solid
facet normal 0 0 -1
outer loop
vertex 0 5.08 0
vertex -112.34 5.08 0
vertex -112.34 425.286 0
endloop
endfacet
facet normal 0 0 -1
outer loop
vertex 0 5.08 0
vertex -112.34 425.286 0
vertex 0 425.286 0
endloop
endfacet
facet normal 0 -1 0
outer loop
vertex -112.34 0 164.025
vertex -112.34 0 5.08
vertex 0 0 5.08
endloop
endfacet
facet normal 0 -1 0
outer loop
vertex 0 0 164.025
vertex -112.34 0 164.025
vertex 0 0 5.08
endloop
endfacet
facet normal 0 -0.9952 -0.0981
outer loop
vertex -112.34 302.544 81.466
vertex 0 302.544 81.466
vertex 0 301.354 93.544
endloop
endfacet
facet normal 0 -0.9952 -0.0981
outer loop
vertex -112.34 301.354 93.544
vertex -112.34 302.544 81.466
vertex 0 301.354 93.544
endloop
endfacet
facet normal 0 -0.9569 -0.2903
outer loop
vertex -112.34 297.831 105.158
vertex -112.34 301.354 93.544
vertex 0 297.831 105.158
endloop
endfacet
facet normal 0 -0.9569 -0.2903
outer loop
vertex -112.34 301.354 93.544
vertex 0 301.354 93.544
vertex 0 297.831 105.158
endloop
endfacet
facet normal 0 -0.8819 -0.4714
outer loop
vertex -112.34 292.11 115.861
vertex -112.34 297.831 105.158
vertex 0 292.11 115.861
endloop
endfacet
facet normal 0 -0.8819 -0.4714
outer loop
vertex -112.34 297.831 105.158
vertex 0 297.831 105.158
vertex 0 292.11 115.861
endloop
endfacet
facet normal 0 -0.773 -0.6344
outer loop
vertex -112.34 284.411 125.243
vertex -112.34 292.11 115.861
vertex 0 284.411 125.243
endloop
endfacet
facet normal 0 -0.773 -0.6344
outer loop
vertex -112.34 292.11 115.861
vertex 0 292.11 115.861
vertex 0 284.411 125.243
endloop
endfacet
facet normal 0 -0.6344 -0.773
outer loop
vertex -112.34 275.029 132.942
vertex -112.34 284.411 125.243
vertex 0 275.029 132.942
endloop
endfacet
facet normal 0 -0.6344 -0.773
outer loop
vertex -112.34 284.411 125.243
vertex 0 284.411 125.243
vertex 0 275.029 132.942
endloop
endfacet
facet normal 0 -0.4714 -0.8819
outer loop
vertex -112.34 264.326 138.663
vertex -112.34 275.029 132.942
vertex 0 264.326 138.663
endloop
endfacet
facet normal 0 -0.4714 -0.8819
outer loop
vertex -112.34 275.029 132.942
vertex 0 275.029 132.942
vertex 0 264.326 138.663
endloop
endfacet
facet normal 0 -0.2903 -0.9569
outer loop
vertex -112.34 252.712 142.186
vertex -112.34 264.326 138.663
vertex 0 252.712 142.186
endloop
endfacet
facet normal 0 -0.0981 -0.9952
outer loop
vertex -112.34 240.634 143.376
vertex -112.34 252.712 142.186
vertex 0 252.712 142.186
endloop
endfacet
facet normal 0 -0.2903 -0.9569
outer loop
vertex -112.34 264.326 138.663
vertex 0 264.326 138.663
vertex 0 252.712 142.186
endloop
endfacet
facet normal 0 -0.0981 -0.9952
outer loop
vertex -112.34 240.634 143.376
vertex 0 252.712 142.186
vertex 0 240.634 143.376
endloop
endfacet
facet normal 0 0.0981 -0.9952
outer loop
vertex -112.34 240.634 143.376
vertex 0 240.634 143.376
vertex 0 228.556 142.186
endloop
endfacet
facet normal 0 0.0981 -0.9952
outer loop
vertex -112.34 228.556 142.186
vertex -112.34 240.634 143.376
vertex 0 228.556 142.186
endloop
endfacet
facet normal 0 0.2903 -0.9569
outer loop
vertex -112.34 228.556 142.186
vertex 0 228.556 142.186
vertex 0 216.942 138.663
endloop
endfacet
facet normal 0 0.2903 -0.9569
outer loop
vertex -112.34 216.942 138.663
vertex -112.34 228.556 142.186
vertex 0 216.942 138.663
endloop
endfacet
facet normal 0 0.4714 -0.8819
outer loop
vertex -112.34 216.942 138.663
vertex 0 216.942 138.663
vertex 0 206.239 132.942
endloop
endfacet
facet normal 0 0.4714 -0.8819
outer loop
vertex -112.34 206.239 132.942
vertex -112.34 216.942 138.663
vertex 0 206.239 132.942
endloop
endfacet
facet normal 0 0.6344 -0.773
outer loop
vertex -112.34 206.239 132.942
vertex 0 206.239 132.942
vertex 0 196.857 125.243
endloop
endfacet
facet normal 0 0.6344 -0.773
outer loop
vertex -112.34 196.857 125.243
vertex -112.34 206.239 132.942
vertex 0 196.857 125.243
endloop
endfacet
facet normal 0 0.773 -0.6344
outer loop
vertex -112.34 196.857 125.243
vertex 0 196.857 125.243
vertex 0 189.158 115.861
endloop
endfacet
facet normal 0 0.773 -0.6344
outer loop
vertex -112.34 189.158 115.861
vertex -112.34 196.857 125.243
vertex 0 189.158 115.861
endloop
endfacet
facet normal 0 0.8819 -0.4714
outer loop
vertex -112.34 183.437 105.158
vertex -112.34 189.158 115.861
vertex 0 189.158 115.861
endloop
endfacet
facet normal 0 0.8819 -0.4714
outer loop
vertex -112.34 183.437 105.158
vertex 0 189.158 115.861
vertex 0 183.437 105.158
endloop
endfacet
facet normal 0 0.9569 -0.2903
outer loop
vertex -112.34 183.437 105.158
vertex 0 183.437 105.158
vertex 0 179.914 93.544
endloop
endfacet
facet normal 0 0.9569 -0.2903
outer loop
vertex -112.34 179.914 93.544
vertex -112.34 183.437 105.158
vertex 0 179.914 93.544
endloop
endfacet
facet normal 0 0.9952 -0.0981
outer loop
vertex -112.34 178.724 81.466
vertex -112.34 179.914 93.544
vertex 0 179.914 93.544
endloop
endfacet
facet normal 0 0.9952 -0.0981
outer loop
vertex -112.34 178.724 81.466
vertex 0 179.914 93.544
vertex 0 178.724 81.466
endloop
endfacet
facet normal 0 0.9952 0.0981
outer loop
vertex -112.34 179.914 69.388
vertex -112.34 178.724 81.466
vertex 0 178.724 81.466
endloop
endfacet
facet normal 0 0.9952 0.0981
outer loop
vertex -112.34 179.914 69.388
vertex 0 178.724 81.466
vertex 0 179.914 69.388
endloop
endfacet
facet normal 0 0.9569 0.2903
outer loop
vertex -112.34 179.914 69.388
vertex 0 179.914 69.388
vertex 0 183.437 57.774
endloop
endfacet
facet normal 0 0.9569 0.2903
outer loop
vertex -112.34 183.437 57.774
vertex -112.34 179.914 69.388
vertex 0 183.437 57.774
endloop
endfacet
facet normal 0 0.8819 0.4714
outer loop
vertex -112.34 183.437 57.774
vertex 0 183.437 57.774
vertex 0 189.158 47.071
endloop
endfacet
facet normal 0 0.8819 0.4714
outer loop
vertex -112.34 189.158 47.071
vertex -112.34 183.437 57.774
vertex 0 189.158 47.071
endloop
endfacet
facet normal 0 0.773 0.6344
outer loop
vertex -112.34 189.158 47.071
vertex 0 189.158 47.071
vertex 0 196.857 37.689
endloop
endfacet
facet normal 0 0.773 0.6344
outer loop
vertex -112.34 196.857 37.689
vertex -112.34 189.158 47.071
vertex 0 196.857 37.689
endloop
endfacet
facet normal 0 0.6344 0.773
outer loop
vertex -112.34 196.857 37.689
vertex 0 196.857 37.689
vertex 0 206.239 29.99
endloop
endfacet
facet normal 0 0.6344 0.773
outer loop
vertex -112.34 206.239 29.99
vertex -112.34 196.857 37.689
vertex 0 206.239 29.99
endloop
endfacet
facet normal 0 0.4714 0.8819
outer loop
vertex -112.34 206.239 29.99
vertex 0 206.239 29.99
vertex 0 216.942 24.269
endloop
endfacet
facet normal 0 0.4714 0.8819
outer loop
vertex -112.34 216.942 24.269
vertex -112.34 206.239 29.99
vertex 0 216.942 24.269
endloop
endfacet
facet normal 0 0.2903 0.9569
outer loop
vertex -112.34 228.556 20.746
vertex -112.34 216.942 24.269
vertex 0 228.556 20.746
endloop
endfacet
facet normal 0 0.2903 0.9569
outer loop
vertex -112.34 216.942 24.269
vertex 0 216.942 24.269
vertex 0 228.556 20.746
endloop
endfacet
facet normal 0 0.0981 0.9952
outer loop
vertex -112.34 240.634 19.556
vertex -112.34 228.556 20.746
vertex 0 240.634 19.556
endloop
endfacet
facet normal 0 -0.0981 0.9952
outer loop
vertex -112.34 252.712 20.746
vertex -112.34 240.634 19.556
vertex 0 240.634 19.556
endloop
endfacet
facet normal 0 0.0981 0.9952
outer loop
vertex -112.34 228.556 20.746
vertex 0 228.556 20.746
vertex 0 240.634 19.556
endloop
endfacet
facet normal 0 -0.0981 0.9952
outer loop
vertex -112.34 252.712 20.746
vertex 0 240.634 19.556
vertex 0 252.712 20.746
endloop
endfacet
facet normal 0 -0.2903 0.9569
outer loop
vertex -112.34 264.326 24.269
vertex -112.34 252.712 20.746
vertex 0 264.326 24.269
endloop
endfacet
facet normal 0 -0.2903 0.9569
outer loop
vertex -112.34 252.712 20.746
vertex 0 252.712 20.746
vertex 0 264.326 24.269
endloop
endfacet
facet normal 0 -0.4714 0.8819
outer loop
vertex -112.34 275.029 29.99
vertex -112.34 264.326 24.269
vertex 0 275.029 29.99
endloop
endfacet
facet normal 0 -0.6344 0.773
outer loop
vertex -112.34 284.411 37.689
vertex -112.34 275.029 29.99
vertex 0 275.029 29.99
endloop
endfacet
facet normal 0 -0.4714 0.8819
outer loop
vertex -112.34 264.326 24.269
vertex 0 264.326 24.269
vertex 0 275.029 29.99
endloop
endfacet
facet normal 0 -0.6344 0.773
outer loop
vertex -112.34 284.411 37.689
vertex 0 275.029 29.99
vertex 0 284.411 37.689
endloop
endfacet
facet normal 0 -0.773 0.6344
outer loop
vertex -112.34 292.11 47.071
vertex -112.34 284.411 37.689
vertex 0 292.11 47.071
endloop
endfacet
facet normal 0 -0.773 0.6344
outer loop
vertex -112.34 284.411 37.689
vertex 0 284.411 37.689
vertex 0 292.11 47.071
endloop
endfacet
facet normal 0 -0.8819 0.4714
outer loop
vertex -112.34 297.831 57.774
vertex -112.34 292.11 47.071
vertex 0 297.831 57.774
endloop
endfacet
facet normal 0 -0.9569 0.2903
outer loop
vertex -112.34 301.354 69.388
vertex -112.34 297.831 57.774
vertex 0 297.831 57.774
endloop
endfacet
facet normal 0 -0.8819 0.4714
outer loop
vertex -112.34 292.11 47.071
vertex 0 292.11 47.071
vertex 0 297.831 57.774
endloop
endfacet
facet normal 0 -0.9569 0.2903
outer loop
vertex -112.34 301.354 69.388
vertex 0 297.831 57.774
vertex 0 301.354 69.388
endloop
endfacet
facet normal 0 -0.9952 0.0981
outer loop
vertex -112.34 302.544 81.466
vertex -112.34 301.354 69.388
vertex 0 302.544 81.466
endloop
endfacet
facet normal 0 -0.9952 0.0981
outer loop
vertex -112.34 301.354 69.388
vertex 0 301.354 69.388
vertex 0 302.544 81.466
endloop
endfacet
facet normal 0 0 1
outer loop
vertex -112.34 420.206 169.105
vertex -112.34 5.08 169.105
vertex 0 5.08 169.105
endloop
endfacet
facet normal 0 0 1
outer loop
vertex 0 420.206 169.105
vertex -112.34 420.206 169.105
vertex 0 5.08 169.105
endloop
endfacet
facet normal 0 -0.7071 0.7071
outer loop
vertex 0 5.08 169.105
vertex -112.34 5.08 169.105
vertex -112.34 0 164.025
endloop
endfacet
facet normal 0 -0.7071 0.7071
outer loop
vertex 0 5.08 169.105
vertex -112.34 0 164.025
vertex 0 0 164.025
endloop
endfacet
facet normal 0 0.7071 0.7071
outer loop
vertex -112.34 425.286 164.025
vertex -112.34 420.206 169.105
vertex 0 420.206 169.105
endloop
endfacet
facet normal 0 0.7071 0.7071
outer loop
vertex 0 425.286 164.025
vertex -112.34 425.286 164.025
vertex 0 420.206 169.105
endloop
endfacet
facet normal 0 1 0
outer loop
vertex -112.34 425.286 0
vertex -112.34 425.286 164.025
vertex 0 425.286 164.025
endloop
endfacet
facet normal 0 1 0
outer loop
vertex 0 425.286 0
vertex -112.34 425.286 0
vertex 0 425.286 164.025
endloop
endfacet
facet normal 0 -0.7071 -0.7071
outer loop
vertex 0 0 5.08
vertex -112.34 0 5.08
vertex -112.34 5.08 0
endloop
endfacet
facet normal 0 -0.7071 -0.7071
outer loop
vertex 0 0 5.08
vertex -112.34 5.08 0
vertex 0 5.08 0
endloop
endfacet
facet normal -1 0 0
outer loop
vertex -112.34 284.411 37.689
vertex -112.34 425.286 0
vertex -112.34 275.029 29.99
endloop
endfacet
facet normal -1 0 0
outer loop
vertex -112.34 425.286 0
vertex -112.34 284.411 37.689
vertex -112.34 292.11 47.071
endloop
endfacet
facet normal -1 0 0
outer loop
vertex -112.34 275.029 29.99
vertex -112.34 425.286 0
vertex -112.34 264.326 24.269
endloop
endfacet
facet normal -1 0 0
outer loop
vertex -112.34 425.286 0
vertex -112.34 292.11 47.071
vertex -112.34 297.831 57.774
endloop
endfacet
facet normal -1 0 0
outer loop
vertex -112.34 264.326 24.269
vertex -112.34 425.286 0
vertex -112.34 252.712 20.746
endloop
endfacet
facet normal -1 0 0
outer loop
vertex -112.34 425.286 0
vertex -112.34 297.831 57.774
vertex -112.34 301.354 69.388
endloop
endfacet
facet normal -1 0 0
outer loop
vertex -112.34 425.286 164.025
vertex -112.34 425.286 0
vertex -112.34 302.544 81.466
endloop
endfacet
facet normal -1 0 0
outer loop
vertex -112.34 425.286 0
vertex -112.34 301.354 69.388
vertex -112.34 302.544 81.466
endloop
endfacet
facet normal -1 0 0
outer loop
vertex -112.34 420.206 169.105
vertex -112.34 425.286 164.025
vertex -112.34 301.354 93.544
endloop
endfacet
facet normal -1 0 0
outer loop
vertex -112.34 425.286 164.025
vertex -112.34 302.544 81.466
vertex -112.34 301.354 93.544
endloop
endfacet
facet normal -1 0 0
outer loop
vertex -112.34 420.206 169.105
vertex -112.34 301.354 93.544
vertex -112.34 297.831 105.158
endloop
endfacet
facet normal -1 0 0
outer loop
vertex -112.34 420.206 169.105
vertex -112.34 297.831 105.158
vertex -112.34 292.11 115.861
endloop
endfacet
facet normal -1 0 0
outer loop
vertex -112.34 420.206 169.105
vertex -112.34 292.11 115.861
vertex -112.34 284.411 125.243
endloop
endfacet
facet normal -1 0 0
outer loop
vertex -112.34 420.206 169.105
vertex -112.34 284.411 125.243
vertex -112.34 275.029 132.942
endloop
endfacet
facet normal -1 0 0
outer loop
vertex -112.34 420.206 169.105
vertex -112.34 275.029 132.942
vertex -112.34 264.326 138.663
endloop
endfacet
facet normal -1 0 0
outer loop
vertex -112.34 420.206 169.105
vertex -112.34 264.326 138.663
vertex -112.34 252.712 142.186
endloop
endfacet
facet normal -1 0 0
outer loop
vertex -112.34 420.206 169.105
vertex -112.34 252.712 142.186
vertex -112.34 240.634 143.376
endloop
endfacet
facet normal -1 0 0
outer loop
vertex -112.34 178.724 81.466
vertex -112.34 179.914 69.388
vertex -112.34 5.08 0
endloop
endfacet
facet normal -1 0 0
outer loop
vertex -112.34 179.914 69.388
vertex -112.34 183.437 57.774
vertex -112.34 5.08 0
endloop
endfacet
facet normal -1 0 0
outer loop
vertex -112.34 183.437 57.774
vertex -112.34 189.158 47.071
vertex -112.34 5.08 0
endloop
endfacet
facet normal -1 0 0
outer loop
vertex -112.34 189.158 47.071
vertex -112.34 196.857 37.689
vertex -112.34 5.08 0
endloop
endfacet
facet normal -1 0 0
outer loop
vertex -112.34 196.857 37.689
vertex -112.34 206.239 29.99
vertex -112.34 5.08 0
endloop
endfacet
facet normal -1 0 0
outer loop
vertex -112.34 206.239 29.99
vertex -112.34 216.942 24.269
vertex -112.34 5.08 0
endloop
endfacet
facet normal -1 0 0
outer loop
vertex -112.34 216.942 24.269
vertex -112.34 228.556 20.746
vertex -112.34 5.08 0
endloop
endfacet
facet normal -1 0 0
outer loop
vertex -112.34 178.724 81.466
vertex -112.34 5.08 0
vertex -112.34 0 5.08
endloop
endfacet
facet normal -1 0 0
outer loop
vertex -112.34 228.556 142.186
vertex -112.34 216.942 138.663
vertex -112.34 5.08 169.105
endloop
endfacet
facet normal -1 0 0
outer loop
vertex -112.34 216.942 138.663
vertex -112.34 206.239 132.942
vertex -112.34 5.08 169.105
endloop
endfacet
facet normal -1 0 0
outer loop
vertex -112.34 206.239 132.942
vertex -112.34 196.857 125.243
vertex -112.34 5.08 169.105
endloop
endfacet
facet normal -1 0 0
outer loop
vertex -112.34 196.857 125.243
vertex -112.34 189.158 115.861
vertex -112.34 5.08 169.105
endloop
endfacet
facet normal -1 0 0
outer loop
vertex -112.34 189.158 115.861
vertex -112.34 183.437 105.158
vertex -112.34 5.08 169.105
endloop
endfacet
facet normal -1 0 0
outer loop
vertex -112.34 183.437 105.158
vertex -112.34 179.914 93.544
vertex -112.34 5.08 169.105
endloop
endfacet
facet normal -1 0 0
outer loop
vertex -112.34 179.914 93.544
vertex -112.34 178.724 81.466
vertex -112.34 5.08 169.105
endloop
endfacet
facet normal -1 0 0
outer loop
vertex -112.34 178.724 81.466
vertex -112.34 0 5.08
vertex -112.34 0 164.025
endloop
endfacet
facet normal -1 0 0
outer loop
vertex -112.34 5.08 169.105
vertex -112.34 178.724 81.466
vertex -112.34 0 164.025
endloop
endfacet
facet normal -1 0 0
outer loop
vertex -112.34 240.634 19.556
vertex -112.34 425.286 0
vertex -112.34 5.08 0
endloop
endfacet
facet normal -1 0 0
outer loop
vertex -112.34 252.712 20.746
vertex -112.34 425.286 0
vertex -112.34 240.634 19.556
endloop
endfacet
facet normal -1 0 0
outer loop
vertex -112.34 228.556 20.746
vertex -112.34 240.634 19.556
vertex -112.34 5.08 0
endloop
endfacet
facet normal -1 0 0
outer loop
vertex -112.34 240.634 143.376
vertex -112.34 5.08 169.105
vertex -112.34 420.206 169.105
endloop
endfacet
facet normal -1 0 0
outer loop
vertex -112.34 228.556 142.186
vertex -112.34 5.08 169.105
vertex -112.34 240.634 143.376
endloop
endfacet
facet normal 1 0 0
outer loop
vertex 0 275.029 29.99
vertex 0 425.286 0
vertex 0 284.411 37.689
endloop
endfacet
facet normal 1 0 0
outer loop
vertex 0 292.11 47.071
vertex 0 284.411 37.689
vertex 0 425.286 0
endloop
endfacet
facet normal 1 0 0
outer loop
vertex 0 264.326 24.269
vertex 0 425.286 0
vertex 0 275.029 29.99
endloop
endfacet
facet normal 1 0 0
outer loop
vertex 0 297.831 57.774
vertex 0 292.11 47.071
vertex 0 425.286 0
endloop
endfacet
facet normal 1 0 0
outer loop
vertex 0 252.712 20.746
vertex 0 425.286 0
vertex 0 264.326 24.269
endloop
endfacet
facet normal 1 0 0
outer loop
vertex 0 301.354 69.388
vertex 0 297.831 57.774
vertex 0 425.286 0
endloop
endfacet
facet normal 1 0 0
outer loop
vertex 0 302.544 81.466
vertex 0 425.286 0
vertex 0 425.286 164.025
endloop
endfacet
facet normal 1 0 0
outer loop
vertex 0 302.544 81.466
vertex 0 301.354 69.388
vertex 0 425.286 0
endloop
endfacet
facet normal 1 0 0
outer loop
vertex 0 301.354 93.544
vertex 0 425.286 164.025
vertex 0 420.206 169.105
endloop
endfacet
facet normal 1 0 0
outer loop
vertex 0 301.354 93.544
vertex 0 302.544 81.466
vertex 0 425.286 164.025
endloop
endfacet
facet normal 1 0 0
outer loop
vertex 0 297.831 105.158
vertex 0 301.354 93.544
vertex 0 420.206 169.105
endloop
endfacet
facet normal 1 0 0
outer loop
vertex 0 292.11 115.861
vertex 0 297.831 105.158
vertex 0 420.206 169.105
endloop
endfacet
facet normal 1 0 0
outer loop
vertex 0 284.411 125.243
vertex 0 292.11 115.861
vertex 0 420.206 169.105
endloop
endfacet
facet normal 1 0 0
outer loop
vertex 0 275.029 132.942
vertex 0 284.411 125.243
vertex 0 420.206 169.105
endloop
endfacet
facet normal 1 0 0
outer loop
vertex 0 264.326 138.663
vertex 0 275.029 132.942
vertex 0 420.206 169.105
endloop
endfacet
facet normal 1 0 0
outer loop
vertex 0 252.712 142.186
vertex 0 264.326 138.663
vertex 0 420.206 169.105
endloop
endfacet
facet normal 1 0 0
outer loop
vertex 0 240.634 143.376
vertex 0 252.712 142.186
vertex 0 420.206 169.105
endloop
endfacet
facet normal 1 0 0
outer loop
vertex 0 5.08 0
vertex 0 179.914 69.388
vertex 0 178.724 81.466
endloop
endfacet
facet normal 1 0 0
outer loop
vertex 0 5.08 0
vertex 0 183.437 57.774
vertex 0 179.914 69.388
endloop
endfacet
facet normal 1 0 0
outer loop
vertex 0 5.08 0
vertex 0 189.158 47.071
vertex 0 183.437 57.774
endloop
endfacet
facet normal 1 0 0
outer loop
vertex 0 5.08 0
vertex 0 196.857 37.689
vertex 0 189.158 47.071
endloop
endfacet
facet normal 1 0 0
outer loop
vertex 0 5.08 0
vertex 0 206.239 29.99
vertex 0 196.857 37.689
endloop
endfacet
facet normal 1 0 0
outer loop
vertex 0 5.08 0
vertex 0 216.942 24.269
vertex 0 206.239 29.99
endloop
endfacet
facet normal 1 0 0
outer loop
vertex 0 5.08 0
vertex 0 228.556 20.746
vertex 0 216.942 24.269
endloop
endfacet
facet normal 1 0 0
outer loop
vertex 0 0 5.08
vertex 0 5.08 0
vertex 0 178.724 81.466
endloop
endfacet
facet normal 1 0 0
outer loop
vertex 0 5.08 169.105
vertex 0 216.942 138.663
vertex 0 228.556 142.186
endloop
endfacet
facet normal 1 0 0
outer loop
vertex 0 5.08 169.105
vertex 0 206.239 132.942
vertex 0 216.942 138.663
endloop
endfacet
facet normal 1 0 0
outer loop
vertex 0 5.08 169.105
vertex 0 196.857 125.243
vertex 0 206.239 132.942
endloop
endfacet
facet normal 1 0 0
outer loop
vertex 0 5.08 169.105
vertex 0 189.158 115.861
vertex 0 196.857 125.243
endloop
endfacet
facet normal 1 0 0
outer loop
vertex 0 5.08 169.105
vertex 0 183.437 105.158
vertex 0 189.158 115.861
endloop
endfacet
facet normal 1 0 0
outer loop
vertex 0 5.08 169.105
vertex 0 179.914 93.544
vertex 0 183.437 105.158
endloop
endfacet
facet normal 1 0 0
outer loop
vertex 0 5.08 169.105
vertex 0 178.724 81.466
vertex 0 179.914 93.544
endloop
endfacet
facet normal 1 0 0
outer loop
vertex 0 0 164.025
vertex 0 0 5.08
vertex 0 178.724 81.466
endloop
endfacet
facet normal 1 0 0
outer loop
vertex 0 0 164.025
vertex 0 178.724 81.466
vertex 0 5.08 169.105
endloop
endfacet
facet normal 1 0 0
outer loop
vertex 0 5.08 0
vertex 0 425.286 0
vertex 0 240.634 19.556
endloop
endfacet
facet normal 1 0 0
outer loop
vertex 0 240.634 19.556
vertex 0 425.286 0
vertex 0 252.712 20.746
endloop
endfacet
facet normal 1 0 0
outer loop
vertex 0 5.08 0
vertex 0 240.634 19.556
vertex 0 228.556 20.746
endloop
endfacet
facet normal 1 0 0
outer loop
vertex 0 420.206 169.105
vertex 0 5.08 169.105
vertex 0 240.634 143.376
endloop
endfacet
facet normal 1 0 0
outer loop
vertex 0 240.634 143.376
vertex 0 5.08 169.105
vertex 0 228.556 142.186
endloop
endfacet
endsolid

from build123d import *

# Parameters (mm, degrees)
F0_W     = 112.340003252
F0_H     = 169.1052764654
F2_DEPTH = 425.2858813852
F3_R     = 61.9097520686
F4_DEPTH = 148.8002743572
F5_SIZE  = 5.08


with BuildPart() as f2:
    # F0 (on Front) → F2 (new body)
    with BuildSketch(Plane.XZ):
        with Locations((-56.170001626, 84.5526382327)):
            Rectangle(F0_W, F0_H)
    extrude(amount=-F2_DEPTH)

    # F3 (on face) → F4 (cut)
    with BuildSketch(Plane.YZ):
        with Locations((240.6340688467, 81.4660638571)):
            Circle(F3_R)
    extrude(amount=-F4_DEPTH, mode=Mode.SUBTRACT)

    # F5
    f5_edges = [f2.edges().sort_by_distance(p)[0] for p in [
        (-56.170002, 425.285881, 169.105276),
        (-56.170002, 0, 169.105276),
        (-56.170002, 0, 0),
    ]]
    chamfer(f5_edges, length=F5_SIZE)


solid = f2.part
